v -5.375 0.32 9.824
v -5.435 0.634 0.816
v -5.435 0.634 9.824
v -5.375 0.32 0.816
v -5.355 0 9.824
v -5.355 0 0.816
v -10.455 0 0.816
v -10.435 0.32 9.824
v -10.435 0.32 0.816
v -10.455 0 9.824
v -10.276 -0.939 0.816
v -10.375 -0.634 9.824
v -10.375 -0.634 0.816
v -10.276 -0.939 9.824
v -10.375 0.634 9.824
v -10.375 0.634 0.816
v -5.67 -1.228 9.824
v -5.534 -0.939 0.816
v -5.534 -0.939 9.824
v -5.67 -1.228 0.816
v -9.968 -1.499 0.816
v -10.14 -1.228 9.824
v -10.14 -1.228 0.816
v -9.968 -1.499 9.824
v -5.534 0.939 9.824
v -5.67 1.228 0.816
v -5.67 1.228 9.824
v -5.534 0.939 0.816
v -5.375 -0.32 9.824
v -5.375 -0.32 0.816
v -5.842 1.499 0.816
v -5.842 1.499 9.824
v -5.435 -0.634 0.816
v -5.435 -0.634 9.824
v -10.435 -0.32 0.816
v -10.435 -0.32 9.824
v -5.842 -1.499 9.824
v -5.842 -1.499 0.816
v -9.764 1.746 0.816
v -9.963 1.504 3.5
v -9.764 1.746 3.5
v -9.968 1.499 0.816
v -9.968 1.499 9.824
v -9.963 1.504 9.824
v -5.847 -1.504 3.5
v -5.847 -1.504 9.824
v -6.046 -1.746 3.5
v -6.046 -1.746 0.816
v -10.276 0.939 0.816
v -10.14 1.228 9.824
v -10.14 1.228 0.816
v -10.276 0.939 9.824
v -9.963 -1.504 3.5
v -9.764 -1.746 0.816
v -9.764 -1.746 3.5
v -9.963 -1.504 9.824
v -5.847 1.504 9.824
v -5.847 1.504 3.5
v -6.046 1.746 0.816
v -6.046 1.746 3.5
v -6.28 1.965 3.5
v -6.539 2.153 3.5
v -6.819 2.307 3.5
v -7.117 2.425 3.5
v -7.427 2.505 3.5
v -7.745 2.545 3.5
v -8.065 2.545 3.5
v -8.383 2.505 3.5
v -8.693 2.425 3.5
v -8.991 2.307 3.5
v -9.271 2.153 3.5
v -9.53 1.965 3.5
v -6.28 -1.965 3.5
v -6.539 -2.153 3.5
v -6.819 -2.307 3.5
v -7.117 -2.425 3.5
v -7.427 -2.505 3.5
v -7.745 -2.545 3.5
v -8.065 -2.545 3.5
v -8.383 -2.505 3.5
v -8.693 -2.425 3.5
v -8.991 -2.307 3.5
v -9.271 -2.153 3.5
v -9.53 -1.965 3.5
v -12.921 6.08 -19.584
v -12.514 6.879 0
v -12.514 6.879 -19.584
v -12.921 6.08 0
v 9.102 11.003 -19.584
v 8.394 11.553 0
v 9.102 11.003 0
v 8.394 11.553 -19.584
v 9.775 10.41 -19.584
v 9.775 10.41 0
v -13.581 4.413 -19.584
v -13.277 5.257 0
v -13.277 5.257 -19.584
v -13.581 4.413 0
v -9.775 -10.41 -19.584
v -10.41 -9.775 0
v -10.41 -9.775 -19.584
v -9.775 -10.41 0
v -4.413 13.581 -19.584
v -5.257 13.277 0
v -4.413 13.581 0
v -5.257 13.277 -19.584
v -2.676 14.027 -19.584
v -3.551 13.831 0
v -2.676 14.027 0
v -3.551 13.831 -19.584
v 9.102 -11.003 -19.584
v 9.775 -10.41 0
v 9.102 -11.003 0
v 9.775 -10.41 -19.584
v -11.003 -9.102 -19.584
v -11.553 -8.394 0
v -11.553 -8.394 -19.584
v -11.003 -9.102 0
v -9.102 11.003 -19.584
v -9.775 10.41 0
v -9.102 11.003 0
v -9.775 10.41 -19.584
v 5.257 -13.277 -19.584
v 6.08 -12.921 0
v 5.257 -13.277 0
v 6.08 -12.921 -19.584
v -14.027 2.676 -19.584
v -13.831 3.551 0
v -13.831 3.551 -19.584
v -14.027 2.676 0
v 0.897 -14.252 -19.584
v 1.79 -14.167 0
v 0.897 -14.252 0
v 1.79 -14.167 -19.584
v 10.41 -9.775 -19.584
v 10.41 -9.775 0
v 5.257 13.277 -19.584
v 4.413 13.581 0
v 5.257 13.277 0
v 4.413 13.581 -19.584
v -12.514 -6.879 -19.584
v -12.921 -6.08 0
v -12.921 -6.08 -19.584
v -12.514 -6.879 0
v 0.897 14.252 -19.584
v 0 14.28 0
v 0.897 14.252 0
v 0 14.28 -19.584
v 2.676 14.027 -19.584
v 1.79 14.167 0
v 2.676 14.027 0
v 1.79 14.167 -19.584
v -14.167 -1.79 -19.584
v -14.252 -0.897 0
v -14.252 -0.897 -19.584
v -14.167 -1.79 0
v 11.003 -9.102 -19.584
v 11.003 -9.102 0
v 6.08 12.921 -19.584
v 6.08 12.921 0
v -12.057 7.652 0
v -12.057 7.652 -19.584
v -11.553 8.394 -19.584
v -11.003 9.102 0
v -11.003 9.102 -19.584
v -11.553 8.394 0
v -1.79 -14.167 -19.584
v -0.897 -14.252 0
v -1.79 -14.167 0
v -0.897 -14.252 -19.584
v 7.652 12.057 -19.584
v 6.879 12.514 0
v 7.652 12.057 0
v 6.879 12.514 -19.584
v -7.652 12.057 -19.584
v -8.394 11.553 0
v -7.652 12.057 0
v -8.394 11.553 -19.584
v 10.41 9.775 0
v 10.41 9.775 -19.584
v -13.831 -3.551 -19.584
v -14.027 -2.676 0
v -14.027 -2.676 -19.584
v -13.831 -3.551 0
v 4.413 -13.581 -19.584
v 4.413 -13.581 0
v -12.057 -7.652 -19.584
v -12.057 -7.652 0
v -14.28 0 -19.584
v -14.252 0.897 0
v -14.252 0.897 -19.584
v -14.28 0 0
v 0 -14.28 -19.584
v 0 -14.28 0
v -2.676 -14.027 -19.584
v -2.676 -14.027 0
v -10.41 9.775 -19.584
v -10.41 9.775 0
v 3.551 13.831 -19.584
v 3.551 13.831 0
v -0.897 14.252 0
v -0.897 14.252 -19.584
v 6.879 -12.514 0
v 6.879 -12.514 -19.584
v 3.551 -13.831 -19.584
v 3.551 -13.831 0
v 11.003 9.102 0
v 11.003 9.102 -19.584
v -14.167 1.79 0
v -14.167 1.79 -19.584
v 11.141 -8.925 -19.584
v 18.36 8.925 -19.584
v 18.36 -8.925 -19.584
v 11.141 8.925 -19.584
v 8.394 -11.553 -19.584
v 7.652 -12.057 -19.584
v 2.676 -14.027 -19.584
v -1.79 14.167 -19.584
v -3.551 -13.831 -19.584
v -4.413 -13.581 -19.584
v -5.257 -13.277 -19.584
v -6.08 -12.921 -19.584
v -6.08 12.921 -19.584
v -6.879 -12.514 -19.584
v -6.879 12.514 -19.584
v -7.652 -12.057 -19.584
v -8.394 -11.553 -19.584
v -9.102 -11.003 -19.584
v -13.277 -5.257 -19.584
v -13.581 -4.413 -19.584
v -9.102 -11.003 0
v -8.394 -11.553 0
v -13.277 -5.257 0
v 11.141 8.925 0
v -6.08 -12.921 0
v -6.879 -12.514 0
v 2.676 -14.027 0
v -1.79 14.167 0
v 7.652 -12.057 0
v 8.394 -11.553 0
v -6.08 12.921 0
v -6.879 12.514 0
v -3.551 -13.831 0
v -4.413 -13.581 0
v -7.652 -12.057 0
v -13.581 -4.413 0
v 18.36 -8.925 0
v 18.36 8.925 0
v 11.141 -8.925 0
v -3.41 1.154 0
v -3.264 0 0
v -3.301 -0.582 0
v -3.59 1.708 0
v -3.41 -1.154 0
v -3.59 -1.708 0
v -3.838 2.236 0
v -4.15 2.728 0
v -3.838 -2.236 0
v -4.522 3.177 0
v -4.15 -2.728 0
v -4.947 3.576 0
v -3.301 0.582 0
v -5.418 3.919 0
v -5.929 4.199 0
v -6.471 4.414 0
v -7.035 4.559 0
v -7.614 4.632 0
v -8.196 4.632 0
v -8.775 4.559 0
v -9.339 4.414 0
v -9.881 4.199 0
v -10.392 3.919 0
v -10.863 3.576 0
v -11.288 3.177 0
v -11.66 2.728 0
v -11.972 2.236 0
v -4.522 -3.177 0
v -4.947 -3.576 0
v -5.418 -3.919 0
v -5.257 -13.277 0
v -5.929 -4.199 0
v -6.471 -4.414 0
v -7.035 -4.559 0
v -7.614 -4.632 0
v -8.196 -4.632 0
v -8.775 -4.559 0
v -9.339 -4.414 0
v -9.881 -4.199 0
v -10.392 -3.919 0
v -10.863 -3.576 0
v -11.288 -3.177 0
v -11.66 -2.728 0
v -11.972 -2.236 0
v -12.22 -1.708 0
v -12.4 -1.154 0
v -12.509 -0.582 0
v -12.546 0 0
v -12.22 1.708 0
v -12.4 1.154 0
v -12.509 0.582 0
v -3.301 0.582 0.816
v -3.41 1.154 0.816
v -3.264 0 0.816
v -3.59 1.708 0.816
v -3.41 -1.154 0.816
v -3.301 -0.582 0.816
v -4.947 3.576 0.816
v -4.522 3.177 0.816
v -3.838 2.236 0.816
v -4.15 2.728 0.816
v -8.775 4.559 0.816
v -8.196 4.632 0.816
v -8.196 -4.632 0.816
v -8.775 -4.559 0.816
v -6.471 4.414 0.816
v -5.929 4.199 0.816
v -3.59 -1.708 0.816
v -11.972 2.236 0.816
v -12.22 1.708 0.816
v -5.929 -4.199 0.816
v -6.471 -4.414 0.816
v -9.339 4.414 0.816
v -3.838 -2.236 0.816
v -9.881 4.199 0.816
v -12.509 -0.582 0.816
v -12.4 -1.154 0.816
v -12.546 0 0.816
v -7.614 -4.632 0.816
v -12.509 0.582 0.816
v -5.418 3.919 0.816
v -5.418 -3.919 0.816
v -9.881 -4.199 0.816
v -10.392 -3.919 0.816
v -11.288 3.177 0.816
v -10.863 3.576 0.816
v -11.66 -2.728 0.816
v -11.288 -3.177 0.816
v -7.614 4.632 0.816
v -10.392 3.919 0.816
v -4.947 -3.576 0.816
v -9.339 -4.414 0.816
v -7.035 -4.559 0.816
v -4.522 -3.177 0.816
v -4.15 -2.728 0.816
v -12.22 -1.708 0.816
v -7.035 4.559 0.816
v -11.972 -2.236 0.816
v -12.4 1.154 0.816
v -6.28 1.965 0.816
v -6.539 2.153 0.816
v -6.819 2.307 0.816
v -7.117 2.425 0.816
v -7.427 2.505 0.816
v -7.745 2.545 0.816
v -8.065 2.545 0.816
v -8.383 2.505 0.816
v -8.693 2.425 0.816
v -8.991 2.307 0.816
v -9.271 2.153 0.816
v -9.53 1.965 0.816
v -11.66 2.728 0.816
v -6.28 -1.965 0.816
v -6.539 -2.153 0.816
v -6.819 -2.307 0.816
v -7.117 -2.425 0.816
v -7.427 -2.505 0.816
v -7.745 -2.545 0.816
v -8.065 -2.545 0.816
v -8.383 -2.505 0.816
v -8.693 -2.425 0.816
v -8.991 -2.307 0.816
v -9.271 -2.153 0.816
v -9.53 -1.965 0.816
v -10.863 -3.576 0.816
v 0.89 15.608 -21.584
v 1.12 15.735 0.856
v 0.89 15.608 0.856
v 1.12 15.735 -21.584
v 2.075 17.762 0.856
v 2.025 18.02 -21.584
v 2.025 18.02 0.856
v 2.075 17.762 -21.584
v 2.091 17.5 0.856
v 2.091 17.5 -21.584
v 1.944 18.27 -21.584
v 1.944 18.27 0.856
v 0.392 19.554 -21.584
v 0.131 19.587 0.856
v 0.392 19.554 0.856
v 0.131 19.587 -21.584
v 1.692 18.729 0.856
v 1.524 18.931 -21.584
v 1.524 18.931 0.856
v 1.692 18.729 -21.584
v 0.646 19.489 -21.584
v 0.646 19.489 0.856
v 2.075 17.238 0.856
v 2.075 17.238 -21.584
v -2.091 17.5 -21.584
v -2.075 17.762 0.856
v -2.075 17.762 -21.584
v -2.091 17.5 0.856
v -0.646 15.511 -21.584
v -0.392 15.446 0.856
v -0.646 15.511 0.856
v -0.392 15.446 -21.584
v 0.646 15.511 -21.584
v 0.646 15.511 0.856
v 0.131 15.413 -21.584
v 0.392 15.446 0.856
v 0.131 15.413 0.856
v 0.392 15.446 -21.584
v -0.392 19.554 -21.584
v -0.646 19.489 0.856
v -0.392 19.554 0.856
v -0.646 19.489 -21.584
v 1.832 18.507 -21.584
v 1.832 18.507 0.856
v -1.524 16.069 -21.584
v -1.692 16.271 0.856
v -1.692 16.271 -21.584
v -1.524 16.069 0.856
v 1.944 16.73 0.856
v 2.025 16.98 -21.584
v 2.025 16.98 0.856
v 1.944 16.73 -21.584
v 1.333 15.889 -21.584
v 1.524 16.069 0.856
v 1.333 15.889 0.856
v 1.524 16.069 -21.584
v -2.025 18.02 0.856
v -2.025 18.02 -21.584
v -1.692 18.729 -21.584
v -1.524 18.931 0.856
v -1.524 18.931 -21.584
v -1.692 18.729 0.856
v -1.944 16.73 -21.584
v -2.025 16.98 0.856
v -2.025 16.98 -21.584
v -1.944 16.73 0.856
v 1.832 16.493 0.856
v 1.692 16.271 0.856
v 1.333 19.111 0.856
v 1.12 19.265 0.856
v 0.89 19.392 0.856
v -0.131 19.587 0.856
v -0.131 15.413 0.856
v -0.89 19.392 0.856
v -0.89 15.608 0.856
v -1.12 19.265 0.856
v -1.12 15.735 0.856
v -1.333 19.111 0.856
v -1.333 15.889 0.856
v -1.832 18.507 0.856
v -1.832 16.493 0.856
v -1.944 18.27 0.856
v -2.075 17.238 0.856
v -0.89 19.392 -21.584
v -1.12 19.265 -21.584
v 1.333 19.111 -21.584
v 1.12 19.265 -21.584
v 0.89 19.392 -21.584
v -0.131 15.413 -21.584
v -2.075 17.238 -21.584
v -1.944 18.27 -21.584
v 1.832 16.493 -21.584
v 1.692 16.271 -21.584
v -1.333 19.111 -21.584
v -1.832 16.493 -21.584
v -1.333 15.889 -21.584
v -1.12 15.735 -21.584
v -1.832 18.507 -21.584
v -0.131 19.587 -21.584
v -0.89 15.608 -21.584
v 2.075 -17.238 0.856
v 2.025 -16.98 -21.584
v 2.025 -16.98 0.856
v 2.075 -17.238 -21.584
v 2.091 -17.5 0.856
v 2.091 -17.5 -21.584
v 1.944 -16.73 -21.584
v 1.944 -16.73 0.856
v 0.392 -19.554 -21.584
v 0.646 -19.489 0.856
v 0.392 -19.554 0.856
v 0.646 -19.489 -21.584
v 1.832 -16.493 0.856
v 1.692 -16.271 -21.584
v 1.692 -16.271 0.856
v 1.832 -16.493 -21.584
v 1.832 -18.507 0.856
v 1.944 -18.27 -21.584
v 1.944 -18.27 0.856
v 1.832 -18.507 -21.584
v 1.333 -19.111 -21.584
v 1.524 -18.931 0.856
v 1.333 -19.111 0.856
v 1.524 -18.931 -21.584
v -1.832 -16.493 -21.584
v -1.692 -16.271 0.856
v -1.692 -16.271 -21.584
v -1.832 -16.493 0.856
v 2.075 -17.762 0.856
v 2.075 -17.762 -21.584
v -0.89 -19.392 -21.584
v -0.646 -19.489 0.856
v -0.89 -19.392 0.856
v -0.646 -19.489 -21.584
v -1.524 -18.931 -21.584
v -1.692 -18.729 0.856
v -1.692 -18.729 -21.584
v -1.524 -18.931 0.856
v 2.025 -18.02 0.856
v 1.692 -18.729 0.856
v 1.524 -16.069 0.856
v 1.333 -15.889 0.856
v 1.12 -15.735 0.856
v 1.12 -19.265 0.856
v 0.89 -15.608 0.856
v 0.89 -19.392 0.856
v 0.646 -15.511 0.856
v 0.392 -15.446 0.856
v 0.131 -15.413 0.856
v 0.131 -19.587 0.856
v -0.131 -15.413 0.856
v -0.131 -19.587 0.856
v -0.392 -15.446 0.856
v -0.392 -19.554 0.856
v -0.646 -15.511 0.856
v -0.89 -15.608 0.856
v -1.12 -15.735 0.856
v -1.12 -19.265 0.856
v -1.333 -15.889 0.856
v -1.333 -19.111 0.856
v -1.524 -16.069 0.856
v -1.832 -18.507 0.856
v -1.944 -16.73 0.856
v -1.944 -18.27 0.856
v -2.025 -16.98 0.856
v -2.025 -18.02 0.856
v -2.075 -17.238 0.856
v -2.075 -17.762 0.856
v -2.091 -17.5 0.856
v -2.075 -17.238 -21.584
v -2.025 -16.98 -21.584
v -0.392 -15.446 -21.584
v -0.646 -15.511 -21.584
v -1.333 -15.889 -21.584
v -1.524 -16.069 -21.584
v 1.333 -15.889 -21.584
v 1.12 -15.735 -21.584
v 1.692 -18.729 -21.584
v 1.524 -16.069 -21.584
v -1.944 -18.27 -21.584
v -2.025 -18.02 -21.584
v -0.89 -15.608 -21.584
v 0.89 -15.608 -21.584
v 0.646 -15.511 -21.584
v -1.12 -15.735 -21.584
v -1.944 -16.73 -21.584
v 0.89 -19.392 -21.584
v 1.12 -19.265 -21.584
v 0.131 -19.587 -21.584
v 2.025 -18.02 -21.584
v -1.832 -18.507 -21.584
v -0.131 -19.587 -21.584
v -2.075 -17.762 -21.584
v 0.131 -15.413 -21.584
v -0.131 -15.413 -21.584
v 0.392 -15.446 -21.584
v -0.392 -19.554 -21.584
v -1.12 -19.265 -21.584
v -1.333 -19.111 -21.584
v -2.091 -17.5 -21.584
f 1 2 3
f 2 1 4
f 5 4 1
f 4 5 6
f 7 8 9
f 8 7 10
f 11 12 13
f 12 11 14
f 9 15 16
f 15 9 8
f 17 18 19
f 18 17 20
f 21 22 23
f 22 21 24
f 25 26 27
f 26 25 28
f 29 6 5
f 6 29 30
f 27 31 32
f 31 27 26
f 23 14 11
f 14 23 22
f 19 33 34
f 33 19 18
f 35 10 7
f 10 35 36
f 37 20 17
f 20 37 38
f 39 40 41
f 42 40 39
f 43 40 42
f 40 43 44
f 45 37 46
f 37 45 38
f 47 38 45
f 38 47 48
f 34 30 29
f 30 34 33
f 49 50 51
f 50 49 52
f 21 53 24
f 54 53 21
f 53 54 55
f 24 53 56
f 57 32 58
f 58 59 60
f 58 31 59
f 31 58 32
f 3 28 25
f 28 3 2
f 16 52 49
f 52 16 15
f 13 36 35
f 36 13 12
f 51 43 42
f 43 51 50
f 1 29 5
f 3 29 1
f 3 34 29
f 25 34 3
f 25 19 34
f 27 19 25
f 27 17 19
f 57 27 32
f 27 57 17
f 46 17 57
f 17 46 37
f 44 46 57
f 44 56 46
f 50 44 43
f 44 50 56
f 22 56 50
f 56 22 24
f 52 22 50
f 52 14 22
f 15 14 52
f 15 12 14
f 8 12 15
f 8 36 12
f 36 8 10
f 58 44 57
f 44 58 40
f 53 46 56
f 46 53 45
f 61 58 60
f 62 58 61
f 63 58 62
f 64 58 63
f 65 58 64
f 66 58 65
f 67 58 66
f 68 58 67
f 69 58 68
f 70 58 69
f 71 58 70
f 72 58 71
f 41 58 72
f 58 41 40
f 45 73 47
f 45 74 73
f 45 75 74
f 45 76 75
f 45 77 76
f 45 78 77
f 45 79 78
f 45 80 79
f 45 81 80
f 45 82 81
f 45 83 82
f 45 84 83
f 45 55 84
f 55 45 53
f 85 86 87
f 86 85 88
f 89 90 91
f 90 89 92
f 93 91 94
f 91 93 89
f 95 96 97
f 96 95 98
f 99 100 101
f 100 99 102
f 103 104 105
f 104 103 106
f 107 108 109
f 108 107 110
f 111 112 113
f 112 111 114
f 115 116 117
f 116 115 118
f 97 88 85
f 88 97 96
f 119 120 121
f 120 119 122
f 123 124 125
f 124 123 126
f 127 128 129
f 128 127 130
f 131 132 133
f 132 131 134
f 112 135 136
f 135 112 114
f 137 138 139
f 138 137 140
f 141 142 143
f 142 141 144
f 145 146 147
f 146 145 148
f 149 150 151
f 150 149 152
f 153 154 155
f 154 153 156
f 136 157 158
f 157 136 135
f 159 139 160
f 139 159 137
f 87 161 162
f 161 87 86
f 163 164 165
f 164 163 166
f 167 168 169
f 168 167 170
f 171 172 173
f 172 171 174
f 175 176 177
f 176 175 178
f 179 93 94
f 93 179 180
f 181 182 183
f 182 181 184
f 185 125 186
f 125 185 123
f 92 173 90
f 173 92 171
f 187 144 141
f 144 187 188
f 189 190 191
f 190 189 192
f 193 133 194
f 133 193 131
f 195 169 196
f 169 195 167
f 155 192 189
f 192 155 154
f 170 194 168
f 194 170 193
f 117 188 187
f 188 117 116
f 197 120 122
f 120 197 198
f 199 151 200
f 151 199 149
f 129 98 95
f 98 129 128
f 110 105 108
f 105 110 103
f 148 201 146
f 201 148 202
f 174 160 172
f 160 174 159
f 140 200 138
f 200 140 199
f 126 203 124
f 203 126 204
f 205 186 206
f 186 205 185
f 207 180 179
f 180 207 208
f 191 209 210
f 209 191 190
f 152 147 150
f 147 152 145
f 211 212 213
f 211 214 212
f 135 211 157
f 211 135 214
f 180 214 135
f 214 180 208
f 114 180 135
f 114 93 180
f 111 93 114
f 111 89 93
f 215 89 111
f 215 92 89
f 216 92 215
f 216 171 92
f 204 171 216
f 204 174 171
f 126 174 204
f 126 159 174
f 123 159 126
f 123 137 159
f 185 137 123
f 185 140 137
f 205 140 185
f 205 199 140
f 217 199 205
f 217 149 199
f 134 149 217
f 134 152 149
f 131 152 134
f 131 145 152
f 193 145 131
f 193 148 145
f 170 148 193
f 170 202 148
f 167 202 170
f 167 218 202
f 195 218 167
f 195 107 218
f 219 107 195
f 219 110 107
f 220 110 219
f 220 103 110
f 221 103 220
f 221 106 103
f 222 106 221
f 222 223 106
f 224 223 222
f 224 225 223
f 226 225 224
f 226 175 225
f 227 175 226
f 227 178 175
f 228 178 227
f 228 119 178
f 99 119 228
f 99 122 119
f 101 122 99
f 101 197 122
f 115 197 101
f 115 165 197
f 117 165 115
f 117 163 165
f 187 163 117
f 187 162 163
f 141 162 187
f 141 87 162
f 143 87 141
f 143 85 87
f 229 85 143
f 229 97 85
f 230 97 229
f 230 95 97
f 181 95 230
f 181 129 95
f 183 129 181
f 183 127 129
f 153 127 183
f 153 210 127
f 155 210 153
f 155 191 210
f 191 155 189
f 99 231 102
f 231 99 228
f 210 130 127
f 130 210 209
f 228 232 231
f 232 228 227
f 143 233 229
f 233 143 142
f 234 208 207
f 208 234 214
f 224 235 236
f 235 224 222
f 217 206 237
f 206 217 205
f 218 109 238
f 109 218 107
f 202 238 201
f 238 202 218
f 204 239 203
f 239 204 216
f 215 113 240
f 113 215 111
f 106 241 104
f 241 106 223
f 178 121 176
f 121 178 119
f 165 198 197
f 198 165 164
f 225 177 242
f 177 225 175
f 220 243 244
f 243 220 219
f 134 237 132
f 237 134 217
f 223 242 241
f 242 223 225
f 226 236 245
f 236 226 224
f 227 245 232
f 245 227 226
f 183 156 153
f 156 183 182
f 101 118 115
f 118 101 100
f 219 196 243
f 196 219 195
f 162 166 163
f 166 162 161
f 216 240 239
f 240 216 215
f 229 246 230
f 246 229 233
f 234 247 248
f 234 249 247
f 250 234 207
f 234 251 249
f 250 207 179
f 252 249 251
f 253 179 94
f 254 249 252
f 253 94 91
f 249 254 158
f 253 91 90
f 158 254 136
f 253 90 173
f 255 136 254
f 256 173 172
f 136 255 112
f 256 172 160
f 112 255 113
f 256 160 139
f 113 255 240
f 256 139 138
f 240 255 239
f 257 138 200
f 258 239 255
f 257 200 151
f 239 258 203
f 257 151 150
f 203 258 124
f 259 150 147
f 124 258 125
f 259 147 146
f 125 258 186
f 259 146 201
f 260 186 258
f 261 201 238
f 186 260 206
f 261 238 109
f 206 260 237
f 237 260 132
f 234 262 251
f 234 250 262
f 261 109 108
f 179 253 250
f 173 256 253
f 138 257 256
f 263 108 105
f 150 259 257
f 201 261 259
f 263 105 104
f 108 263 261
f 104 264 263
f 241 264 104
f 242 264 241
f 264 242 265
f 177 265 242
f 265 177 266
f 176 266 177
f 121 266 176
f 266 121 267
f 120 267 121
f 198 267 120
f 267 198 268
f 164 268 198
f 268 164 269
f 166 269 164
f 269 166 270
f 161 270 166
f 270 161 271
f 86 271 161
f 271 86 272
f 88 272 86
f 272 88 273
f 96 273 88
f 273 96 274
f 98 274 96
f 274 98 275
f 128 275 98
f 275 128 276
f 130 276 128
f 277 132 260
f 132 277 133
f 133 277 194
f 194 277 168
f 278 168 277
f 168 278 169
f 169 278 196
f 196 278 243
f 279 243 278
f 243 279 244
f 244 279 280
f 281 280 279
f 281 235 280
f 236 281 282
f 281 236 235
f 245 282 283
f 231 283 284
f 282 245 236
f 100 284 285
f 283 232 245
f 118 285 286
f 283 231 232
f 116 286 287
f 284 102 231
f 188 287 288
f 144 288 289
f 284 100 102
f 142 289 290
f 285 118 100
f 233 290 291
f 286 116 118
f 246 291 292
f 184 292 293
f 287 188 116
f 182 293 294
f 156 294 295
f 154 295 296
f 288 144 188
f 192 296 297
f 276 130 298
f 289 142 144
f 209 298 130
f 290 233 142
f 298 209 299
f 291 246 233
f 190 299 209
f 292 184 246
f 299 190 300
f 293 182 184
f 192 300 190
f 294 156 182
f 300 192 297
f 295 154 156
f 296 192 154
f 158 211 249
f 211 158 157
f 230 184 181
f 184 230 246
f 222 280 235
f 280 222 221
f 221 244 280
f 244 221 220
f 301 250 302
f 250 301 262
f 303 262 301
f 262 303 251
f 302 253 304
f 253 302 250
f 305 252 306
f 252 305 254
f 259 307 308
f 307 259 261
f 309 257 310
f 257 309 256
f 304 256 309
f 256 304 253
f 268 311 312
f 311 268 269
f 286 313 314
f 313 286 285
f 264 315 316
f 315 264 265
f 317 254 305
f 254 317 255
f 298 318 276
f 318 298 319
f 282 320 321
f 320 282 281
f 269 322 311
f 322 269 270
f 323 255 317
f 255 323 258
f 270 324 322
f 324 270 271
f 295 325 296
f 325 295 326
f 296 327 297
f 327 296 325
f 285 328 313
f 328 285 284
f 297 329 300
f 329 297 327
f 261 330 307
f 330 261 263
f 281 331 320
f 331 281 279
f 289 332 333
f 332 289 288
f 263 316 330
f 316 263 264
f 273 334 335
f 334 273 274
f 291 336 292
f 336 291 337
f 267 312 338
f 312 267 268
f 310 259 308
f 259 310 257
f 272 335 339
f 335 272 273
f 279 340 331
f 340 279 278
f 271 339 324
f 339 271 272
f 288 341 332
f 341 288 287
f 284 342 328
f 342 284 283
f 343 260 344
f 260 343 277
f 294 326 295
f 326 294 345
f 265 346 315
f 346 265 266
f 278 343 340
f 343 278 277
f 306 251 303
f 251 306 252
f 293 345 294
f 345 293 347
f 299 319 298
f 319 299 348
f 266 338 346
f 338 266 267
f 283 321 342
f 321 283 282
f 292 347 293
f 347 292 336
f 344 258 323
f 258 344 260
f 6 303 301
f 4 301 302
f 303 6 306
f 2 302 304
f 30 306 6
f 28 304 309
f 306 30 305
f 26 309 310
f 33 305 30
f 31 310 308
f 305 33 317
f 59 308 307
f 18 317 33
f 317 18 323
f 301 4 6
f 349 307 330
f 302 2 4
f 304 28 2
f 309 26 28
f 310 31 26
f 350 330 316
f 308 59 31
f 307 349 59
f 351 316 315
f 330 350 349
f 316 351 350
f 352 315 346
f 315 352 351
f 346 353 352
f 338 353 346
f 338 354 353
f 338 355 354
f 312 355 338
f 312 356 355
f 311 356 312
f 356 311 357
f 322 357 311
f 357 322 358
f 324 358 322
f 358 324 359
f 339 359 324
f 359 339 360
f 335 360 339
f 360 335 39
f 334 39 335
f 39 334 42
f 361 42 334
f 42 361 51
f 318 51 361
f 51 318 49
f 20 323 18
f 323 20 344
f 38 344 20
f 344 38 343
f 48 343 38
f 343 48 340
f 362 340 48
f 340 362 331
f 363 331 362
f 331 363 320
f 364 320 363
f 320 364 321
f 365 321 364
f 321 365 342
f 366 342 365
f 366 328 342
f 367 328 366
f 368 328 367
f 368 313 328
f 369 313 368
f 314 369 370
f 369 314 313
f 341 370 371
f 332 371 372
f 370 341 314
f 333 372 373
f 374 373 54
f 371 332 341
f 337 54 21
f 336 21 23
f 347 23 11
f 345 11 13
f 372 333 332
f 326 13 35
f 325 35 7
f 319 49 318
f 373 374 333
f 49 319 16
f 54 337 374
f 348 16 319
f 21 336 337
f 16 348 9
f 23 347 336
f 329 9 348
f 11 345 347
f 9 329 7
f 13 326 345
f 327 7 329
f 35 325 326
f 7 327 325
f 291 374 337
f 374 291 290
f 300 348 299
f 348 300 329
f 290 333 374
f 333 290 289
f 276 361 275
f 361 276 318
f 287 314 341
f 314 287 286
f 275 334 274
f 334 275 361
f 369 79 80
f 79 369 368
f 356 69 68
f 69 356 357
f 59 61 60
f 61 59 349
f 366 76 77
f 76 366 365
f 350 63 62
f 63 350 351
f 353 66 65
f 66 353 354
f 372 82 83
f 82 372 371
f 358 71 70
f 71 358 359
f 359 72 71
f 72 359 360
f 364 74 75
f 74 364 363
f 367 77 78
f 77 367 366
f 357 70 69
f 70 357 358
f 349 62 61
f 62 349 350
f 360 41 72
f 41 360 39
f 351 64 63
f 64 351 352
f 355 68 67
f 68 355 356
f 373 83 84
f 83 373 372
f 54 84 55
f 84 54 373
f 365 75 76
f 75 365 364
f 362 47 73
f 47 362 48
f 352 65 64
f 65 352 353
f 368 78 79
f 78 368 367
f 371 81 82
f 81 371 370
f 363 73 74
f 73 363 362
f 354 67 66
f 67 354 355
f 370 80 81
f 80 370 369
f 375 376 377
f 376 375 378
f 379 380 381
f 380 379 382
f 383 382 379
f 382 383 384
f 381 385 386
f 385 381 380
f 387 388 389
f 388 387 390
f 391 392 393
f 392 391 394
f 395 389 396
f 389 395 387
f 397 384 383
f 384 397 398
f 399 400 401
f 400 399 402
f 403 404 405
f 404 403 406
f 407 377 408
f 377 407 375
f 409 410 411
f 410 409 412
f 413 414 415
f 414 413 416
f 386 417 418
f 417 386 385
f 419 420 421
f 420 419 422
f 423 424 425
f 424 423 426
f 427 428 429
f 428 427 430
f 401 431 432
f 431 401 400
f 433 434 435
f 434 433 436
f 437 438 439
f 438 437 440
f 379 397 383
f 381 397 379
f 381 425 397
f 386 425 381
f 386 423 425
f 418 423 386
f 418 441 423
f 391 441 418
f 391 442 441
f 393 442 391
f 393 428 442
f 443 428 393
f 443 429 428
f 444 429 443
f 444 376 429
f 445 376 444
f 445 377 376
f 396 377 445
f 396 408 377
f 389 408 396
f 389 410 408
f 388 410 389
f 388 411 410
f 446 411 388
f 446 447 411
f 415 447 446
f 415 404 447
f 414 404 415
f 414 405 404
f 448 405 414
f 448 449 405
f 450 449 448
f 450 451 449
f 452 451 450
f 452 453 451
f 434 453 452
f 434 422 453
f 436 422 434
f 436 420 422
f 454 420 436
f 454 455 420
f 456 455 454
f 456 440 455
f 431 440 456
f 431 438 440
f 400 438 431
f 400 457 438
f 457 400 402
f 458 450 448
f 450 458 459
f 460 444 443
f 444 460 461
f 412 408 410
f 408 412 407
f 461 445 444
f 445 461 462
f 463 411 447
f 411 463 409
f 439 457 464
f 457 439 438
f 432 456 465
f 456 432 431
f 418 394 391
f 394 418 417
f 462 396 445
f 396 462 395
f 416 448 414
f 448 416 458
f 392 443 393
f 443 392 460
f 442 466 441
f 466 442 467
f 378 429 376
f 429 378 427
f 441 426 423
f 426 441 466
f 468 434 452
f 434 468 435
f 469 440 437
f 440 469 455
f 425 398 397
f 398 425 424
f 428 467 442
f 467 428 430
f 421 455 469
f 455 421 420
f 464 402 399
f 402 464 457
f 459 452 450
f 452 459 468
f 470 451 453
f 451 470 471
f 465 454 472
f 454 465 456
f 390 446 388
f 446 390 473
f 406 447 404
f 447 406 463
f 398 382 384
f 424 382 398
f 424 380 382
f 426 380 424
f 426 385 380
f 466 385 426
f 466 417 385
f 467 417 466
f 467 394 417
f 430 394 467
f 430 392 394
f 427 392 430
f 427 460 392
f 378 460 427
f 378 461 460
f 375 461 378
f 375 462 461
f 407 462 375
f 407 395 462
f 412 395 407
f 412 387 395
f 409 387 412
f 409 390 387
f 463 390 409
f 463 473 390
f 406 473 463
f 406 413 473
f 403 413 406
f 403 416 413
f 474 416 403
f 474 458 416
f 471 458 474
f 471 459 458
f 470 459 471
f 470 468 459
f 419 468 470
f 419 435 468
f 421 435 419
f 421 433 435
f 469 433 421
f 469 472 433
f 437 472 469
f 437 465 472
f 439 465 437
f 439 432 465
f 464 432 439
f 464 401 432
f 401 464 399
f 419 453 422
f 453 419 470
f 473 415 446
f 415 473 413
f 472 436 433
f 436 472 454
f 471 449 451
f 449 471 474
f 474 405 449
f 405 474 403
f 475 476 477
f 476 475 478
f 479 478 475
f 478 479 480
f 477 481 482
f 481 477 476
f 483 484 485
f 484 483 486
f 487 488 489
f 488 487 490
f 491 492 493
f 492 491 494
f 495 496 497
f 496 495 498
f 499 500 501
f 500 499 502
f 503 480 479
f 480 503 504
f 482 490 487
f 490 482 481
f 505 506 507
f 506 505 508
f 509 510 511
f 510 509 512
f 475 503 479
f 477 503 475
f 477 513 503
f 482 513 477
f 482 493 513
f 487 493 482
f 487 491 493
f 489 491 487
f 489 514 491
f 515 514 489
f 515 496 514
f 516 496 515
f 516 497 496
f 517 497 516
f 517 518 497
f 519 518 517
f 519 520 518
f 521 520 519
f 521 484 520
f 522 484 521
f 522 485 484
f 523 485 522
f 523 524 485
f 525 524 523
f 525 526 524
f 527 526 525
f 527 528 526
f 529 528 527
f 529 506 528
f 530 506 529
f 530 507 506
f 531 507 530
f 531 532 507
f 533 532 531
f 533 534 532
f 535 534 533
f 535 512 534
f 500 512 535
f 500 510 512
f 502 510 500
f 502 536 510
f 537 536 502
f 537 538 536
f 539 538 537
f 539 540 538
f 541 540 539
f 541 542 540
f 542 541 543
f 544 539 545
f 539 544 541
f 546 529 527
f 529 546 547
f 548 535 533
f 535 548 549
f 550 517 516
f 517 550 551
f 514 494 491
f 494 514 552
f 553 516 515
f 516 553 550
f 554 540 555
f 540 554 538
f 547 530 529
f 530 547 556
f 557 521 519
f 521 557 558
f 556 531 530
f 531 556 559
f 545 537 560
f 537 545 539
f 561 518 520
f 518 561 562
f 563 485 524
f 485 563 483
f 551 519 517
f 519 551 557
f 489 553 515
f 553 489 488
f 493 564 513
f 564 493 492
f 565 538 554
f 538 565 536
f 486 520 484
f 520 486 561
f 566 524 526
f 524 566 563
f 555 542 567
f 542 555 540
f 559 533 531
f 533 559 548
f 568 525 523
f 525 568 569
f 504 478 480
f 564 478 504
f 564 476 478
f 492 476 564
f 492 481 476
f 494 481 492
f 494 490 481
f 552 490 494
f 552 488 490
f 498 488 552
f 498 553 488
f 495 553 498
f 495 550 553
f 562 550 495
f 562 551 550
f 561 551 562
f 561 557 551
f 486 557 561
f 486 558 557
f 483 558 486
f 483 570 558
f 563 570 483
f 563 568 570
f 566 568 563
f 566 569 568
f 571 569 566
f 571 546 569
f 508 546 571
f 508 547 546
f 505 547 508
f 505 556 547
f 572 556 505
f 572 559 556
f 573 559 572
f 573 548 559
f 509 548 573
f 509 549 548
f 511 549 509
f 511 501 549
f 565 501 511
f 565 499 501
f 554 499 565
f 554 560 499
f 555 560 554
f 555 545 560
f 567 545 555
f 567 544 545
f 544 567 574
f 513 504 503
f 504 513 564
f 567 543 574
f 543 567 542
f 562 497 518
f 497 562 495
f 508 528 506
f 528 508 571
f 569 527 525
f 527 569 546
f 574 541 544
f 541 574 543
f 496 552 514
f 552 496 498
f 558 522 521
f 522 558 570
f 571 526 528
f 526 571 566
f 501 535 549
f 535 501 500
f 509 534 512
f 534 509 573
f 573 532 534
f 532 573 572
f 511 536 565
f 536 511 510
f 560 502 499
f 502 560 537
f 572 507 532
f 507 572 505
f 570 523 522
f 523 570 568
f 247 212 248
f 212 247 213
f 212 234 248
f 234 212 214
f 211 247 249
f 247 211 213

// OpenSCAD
module Stepper5VGear (margin, axisrotation) 
{
    faktor = margin == true ? 1.02 : 1;
    
    // stepper motor body
    bodyHeight = 19.2 * faktor;
    bodyRadius = 14 * faktor;
    translate([0,0,-bodyHeight]) cylinder(h=bodyHeight, r=bodyRadius,  $fn=100, center=false);   
    
    // static tower
    staticTowerRadius = 4.55* faktor;
    staticTowerMargin= 1.7* faktor;
    translate([-bodyRadius+staticTowerRadius+staticTowerMargin,0,0]) cylinder(h=1.6* faktor, r=staticTowerRadius, $fn=50, center=true); 
    
    // axis
    
        axisRadius = 2.5* faktor;
        translate([-bodyRadius+staticTowerRadius+staticTowerMargin,0,0]) cylinder(h=7, r=axisRadius, $fn=50, center=true); 
        
        intersection() 
        {
            cubeHeight = 6.2* faktor;
            translate([-bodyRadius+staticTowerRadius+staticTowerMargin,0,0]) cylinder(h=30* faktor, r=axisRadius, $fn=50, center=true); 
            translate([-bodyRadius+staticTowerRadius+staticTowerMargin,0,3.5 + cubeHeight/2]) rotate([0,0,axisrotation]) cube([2.95* faktor,5* faktor,6.2* faktor],center=true);
        }

    
    // holder
    translate([0,35/2,-bodyHeight-2]) cylinder(h=22* faktor, r=2.05* faktor,  $fn=50, center=false);   
    translate([0,-35/2,-bodyHeight-2]) cylinder(h=22* faktor, r=2.05* faktor,  $fn=50, center=false);   
    
    // cable holder
    translate([bodyRadius,0,-bodyHeight/2]) cube([8* faktor,17.5* faktor,bodyHeight],center=true);
    
    // Print-Dummy-Base
    //baseHeight = 3;
    //translate([0,0,-bodyHeight+baseHeight/2])  cube([10,42,baseHeight],center=true);
}



//color([1,0,1]) Stepper5VGear(false);
Stepper5VGear(true,90);
